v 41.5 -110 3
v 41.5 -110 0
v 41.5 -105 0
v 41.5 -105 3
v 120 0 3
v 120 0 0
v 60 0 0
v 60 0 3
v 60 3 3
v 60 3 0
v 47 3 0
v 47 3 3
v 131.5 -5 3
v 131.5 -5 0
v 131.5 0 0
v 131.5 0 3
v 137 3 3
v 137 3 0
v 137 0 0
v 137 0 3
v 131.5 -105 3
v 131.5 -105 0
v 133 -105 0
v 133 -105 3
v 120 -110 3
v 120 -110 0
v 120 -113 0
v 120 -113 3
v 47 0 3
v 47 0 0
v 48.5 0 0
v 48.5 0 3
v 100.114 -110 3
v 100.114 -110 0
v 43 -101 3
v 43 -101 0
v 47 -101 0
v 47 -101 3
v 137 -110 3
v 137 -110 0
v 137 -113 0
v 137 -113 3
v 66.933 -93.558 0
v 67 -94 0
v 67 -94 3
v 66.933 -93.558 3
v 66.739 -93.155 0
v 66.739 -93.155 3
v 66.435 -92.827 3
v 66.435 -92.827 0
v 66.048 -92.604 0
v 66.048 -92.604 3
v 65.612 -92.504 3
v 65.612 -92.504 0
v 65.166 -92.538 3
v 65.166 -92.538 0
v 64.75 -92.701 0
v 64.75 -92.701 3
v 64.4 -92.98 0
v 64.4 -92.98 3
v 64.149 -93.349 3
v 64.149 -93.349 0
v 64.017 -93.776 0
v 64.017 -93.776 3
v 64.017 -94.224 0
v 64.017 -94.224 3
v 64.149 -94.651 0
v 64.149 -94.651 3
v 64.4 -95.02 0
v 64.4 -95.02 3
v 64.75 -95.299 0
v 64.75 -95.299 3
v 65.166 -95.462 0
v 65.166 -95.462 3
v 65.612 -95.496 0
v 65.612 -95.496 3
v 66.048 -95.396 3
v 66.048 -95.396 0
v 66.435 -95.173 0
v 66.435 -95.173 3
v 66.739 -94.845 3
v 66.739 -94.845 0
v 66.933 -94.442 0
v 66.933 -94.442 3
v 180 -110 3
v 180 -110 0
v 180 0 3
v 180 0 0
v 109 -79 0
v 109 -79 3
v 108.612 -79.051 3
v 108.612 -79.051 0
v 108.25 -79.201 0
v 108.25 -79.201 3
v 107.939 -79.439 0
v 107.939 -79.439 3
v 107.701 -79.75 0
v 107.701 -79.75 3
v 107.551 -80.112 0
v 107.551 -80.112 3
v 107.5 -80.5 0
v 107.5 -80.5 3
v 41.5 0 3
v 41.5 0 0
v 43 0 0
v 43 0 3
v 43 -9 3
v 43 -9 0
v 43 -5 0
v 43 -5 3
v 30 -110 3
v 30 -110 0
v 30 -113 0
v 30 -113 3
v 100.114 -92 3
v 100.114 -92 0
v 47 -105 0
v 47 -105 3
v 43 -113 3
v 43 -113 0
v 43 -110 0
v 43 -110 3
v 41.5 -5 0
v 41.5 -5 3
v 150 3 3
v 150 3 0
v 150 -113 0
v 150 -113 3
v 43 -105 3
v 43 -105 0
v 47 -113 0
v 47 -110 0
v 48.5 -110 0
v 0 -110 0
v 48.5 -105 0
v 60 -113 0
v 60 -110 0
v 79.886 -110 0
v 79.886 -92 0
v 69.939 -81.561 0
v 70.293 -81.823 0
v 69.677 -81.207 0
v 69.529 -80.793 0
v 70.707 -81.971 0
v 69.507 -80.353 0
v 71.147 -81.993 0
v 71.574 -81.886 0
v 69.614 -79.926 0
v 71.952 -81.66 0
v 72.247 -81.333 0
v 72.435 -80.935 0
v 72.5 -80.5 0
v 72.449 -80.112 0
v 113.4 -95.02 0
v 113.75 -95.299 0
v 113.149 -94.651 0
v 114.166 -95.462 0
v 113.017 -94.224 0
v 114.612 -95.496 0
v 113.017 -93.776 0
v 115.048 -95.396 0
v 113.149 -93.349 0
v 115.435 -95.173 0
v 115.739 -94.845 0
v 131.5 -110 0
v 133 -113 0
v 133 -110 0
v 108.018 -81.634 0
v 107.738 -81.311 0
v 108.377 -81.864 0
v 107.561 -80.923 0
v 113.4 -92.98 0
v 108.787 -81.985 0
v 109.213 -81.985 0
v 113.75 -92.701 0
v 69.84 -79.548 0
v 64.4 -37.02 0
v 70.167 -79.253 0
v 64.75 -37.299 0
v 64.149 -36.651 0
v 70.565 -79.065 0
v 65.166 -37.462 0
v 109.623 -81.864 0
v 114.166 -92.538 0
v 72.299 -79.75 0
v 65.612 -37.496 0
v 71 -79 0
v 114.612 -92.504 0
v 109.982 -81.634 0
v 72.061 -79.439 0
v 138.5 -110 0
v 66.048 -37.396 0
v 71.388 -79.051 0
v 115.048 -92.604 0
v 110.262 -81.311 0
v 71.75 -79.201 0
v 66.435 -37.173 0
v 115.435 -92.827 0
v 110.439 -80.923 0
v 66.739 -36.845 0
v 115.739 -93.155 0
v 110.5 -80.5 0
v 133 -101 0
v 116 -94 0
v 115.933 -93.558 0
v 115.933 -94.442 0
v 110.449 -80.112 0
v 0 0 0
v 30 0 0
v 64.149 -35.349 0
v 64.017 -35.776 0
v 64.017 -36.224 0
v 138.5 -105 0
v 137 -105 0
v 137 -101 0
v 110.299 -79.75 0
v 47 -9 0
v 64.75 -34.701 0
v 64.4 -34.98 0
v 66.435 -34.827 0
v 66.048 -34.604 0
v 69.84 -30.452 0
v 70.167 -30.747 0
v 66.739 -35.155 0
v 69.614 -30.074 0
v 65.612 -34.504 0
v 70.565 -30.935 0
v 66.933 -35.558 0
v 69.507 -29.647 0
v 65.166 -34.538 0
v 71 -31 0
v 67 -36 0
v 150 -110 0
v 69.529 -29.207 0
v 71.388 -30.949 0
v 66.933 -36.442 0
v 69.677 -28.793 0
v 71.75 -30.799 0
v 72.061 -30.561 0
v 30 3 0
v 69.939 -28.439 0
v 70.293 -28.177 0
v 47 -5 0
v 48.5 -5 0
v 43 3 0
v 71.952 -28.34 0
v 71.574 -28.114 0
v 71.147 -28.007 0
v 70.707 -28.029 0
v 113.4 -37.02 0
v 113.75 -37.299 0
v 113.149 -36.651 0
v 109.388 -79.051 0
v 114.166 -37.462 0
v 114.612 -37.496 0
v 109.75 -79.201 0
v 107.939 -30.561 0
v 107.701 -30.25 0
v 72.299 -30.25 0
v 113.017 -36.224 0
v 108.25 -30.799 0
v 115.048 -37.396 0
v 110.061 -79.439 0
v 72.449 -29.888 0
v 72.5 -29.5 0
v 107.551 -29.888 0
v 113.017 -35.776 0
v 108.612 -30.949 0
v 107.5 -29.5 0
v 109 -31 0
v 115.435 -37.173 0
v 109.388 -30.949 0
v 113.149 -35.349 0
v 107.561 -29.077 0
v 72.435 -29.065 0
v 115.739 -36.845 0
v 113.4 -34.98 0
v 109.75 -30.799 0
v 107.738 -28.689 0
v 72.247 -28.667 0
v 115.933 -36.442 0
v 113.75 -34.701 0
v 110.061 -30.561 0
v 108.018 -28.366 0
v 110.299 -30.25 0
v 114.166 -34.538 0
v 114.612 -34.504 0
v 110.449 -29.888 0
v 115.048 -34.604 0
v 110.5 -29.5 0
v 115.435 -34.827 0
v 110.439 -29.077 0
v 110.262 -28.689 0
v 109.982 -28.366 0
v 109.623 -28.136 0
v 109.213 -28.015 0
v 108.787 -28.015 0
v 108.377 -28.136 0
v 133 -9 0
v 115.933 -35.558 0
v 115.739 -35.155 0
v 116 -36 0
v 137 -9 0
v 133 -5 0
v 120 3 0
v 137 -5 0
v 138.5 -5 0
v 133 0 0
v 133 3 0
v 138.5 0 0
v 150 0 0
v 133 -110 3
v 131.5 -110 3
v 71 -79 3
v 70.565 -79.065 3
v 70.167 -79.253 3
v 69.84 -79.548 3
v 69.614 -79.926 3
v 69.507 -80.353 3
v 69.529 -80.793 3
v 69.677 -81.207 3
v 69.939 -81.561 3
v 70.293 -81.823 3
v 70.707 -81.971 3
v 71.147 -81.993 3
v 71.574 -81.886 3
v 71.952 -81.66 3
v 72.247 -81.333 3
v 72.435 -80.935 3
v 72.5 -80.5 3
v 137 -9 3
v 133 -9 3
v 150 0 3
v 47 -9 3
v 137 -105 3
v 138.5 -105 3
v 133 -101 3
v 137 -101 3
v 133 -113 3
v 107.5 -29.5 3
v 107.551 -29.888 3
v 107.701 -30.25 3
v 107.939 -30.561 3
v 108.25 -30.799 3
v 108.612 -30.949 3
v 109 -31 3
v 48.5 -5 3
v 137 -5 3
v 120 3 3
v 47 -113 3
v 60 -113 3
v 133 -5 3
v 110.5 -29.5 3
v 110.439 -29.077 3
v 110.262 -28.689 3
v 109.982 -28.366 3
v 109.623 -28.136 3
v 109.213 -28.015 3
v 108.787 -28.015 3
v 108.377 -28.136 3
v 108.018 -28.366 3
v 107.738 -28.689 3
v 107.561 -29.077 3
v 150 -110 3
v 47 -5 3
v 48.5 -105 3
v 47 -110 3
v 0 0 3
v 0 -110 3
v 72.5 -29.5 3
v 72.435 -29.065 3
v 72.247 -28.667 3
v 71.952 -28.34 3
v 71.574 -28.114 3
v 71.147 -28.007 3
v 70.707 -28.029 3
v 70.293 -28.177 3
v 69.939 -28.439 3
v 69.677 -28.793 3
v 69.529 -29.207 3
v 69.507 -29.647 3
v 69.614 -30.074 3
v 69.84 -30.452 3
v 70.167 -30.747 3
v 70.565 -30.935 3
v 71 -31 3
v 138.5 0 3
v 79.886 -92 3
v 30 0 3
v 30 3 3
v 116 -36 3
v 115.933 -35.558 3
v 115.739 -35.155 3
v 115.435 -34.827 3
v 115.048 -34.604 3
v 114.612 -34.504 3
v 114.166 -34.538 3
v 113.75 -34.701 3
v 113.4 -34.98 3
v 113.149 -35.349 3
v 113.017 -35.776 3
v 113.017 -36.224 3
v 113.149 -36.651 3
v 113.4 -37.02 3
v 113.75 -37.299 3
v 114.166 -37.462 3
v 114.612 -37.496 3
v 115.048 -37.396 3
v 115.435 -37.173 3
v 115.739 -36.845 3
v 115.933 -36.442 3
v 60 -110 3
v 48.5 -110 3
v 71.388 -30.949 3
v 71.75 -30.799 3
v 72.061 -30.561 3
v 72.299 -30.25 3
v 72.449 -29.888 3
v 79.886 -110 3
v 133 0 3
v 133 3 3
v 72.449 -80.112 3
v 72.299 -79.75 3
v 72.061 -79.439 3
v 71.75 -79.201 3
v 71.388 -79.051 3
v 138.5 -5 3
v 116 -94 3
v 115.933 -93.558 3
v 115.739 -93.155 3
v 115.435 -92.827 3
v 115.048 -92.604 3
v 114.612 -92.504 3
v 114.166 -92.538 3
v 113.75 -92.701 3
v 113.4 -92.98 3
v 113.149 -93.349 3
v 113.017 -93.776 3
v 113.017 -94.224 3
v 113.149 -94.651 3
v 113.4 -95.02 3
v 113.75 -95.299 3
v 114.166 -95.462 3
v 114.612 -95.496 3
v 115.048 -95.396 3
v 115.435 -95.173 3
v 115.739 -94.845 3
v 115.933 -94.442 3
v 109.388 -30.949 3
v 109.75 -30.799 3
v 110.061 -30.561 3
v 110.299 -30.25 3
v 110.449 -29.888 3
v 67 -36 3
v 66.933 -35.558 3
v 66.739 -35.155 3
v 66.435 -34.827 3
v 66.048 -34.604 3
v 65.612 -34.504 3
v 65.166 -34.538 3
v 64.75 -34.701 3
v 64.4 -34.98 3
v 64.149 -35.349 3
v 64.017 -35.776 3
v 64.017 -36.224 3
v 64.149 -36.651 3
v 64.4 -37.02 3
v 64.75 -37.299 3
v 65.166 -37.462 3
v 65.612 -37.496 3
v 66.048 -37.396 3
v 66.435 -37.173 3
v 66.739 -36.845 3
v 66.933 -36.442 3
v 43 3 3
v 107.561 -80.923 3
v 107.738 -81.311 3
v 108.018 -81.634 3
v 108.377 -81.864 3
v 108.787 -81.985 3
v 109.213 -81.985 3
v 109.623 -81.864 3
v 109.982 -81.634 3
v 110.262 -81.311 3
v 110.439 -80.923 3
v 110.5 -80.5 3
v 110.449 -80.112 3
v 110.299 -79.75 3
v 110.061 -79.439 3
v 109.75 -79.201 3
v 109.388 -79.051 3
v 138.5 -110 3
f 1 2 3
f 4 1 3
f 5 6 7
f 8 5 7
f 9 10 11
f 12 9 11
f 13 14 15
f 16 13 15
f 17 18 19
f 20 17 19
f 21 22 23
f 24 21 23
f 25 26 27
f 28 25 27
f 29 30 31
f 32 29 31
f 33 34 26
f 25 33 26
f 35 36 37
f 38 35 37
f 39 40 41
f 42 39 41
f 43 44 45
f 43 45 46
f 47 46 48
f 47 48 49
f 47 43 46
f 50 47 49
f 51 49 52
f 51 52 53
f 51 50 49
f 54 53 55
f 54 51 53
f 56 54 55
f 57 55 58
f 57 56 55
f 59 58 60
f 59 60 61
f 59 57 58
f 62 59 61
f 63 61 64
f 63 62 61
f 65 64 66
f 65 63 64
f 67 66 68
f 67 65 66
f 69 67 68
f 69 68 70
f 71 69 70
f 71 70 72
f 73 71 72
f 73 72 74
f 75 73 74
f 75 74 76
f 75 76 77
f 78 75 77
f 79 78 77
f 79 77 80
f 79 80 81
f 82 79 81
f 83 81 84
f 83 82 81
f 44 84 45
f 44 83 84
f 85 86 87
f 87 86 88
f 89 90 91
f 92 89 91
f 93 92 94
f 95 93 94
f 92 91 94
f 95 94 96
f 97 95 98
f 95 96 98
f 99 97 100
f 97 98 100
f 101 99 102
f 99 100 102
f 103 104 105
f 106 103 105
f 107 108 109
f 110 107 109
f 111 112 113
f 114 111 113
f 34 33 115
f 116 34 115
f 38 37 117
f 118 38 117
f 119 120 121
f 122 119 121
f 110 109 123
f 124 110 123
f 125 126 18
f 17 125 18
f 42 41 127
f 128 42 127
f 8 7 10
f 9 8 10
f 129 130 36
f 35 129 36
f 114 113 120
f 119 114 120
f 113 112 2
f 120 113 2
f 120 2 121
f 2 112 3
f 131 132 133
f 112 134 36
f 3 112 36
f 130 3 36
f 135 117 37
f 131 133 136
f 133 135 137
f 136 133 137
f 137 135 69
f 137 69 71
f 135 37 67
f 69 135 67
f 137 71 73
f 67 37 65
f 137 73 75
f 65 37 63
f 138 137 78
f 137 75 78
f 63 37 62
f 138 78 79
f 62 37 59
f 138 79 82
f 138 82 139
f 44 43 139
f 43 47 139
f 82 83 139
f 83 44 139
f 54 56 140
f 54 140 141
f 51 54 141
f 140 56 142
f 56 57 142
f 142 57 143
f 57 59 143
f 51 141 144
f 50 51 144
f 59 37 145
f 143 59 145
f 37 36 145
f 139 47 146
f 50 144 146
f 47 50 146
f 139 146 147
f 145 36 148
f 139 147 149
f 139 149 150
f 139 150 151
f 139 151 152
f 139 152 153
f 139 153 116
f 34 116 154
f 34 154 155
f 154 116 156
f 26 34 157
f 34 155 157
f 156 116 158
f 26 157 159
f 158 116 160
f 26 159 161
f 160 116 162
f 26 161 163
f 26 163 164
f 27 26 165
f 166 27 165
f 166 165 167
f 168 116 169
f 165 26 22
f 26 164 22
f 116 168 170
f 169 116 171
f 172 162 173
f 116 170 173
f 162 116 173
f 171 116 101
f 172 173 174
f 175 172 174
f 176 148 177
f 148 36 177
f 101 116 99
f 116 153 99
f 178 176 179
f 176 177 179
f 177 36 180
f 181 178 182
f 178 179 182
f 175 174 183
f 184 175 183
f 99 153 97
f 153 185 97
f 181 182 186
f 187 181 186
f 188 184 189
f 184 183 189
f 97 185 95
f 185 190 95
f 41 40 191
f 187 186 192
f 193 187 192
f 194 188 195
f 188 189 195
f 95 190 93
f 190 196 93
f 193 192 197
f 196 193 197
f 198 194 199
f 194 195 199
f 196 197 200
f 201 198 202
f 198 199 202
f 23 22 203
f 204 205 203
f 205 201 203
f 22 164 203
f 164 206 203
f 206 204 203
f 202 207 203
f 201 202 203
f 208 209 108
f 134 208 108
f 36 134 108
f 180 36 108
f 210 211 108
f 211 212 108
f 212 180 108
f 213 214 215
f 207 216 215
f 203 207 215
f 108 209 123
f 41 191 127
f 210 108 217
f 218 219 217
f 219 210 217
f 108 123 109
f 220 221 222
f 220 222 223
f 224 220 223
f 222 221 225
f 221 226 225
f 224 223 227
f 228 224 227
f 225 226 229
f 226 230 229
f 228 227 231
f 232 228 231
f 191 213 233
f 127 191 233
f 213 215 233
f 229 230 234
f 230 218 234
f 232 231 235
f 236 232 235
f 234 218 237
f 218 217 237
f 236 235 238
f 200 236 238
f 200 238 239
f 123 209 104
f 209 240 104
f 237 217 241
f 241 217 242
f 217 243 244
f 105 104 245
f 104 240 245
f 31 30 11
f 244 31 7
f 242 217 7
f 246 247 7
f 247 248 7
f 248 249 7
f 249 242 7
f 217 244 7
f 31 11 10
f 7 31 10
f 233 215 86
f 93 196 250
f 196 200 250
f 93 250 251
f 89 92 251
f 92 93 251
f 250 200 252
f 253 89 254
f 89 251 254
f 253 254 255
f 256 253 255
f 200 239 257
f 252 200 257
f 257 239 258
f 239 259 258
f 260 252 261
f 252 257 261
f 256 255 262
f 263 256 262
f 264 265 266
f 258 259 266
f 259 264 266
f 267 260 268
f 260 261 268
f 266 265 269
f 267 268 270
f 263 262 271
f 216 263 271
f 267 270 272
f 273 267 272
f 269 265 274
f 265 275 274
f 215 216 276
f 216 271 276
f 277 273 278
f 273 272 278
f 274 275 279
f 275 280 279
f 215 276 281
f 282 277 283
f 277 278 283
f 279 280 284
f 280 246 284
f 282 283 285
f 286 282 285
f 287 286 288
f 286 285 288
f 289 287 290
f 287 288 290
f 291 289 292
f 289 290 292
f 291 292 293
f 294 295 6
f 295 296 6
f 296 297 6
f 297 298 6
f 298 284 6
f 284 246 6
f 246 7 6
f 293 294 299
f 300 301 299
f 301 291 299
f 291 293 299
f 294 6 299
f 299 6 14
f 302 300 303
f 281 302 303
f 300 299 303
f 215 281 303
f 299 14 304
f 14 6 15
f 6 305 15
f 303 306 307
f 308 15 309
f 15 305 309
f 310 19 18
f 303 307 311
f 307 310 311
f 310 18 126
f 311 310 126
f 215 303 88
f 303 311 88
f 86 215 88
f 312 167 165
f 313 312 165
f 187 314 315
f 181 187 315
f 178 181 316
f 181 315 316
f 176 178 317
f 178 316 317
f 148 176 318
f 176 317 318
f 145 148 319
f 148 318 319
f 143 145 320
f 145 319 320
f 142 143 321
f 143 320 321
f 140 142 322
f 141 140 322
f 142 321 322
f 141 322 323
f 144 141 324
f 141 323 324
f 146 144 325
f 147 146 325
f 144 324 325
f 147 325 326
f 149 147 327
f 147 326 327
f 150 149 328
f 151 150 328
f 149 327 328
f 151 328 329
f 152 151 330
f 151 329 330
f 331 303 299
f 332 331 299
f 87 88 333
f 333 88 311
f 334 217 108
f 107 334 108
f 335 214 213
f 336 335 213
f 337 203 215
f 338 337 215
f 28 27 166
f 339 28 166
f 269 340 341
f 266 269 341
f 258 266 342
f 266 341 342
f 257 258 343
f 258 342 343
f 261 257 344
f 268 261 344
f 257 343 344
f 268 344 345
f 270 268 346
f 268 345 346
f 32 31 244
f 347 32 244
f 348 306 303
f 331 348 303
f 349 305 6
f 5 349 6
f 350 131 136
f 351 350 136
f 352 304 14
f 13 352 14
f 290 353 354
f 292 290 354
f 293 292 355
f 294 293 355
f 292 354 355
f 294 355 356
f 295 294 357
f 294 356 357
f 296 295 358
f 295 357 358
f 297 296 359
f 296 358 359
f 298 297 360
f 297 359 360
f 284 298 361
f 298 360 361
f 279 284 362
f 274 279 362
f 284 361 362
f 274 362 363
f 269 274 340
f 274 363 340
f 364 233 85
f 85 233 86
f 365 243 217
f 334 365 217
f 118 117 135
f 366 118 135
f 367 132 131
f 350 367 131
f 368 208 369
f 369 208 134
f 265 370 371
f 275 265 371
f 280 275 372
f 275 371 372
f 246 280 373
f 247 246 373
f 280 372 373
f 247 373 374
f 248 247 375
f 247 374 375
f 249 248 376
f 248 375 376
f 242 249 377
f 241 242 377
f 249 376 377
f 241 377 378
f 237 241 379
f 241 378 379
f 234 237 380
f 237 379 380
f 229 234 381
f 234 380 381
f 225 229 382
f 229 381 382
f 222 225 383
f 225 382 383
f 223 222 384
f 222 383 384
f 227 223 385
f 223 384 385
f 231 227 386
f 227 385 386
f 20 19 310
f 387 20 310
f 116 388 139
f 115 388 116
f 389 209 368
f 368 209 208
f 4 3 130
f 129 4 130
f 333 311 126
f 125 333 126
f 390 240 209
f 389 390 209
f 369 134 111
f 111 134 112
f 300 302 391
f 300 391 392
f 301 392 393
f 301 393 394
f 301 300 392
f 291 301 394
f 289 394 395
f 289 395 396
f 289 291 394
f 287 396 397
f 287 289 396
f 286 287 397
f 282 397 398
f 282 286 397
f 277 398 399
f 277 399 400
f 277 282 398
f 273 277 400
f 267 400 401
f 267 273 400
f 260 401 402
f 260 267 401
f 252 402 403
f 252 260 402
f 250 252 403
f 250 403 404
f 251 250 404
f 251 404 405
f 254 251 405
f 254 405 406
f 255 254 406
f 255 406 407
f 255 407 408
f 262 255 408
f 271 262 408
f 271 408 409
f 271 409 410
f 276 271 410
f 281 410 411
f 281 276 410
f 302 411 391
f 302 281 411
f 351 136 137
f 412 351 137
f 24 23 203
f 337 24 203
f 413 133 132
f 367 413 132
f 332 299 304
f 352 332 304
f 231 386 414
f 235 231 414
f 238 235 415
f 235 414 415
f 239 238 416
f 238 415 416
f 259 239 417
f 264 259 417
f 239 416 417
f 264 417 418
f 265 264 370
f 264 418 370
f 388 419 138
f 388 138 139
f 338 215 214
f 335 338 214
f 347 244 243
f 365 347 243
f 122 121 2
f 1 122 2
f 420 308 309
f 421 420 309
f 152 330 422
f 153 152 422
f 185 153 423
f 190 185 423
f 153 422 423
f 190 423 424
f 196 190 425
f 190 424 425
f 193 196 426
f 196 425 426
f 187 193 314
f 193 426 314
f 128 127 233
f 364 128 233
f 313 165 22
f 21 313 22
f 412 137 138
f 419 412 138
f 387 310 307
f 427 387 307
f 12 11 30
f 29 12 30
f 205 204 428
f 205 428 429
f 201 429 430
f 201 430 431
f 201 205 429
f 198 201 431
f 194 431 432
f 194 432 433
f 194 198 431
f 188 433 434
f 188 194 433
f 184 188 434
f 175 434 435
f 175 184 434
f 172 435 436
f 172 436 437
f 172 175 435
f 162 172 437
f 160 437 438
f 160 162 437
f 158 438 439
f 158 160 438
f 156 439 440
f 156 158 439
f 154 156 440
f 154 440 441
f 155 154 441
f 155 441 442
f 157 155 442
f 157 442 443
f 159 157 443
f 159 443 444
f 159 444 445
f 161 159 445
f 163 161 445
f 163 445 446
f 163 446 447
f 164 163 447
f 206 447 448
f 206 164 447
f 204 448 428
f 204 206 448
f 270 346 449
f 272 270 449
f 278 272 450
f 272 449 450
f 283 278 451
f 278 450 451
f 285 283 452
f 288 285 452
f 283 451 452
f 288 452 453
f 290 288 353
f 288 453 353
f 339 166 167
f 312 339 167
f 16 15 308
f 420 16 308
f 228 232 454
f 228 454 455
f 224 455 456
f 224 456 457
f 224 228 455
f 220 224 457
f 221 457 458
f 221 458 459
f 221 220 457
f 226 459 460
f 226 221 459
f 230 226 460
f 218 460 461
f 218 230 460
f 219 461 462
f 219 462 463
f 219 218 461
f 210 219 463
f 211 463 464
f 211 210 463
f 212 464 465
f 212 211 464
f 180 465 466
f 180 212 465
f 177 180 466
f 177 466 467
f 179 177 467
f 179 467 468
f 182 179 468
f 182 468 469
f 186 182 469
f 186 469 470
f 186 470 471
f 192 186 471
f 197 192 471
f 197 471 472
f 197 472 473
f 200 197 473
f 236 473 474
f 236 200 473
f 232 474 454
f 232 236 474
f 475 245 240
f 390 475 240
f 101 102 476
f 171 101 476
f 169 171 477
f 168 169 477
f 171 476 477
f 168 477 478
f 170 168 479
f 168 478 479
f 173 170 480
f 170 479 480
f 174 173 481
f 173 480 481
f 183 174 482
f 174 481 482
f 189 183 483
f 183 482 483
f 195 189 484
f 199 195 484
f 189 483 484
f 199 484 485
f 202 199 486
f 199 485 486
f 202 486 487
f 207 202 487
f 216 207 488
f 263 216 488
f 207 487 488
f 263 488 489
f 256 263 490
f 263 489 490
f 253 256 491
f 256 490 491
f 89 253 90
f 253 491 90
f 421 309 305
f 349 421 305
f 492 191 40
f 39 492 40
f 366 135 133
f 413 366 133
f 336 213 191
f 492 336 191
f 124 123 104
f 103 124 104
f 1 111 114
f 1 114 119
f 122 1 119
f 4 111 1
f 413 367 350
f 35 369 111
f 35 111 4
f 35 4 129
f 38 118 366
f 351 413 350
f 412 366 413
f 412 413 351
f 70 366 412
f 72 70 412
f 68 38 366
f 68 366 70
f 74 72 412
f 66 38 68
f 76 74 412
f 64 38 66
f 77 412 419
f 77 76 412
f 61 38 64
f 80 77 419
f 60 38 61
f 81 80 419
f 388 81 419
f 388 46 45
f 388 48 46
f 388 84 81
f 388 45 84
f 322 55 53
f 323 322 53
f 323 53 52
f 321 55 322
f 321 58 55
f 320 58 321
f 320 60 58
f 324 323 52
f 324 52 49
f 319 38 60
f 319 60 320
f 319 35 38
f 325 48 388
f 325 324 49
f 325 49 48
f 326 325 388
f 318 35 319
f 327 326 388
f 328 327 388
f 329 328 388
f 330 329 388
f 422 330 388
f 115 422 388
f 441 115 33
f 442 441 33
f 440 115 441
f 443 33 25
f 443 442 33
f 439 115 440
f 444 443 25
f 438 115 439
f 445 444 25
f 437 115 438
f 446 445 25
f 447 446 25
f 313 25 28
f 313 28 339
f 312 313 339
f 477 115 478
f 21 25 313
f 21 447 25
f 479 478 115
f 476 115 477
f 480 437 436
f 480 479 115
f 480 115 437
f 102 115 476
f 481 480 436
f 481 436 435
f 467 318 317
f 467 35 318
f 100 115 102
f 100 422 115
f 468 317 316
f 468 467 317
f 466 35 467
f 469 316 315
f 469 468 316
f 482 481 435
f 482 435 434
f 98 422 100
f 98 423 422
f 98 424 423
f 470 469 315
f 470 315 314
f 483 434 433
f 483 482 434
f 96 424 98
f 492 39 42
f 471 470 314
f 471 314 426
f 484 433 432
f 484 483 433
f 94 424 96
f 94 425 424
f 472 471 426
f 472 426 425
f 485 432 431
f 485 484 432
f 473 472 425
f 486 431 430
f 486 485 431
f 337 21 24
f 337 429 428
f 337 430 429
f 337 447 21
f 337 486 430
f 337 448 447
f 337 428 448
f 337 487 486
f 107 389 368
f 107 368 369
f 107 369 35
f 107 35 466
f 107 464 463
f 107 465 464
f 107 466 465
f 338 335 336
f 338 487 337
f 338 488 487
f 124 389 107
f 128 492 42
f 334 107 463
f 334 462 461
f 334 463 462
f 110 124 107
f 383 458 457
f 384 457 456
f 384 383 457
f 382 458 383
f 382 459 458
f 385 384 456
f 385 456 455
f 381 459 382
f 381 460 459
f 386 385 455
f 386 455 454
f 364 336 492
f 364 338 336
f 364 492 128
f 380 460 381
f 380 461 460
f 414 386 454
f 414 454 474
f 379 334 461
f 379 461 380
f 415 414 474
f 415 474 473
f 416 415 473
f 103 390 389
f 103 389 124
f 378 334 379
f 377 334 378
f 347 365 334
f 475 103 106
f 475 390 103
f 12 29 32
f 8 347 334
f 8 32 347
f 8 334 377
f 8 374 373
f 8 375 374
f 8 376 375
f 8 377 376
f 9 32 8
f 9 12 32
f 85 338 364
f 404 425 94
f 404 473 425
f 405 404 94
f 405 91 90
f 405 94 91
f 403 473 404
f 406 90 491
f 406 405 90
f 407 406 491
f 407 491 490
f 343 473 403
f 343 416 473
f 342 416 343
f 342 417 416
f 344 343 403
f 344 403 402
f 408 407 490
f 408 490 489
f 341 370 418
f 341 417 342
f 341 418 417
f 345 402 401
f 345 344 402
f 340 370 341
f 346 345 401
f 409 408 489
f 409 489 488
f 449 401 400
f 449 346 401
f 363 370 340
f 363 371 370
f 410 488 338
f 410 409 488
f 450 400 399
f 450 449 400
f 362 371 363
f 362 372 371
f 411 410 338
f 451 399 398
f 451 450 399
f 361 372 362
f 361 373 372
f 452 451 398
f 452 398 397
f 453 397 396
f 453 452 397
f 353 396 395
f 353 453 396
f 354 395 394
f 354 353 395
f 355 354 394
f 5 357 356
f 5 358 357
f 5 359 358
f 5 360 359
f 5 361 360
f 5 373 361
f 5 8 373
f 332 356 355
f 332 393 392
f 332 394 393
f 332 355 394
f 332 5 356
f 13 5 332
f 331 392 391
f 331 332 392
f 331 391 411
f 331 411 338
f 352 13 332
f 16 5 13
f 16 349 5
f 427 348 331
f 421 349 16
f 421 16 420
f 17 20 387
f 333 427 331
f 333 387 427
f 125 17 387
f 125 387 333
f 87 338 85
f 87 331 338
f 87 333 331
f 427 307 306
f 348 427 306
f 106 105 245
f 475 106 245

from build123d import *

# Parameters (mm, degrees)
SKETCH_1_W          = 28
SKETCH_1_H          = 42.5
SKETCH_1_R          = 1.5
EXTRUDE_1_DEPTH     = 3
SKETCH1_W           = 20.227510382
SKETCH1_H           = 18
CUT_EXTRUDE1_DEPTH  = 10
CUT_EXTRUDE_1_DEPTH = 213.55117031


with BuildPart() as part:
    # 草图1 → 凸台-拉伸1 (new body)
    # profile 1 of 16: a face of its own
    with BuildSketch(Plane.XY):
        Polygon((41.5, 0), (43, 0), (43, 3), (30, 3), (30, 0), align=None)
    # profile 2 of 16: a face of its own
    with BuildSketch(Plane.XY):
        Polygon((48.5, 0), (60, 0), (60, 3), (47, 3), (47, 0), align=None)
    # profile 3 of 16: a face of its own
    with BuildSketch(Plane.XY):
        Polygon((120, 3), (120, 0), (131.5, 0), (133, 0), (133, 3), align=None)
    # profile 4 of 16: a face of its own
    with BuildSketch(Plane.XY):
        Polygon((137, 3), (137, 0), (138.5, 0), (150, 0), (150, 3), align=None)
    # profile 5 of 16: a face of its own
    with BuildSketch(Plane.XY):
        Polygon((120, 0), (90, 0), (90, -12.5), (118, -12.5), (118, -55), (180, -55), (180, 0), (150, 0), (138.5, 0), (138.5, -5), (137, -5), (137, -9), (133, -9), (133, -5), (131.5, -5), (131.5, 0), align=None)
    # profile 6 of 16: a face of its own
    with BuildSketch(Plane.XY):
        Polygon((90, -12.5), (90, 0), (60, 0), (48.5, 0), (48.5, -5), (47, -5), (47, -9), (43, -9), (43, -5), (41.5, -5), (41.5, 0), (30, 0), (0, 0), (0, -55), (62, -55), (62, -12.5), align=None)
    # profile 7 of 16: a face of its own
    with BuildSketch(Plane.XY):
        with Locations((76, -33.75)):
            Rectangle(SKETCH_1_W, SKETCH_1_H)
        with Locations((65.5, -36)):
            Circle(SKETCH_1_R, mode=Mode.SUBTRACT)
    # profile 8 of 16: a face of its own
    with BuildSketch(Plane.XY):
        with Locations((104, -33.75)):
            Rectangle(SKETCH_1_W, SKETCH_1_H)
        with Locations((114.5, -36)):
            Circle(SKETCH_1_R, mode=Mode.SUBTRACT)
    # profile 9 of 16: a face of its own
    with BuildSketch(Plane.XY):
        Polygon((41.5, -110), (30, -110), (30, -113), (43, -113), (43, -110), align=None)
    # profile 10 of 16: a face of its own
    with BuildSketch(Plane.XY):
        Polygon((60, -113), (60, -110), (48.5, -110), (47, -110), (47, -113), align=None)
    # profile 11 of 16: a face of its own
    with BuildSketch(Plane.XY):
        Polygon((131.5, -110), (120, -110), (120, -113), (133, -113), (133, -110), align=None)
    # profile 12 of 16: a face of its own
    with BuildSketch(Plane.XY):
        Polygon((150, -113), (150, -110), (138.5, -110), (137, -110), (137, -113), align=None)
    # profile 13 of 16: a face of its own
    with BuildSketch(Plane.XY):
        Polygon((118, -97.5), (90, -97.5), (90, -110), (120, -110), (131.5, -110), (131.5, -105), (133, -105), (133, -101), (137, -101), (137, -105), (138.5, -105), (138.5, -110), (150, -110), (180, -110), (180, -55), (118, -55), align=None)
    # profile 14 of 16: a face of its own
    with BuildSketch(Plane.XY):
        Polygon((90, -110), (90, -97.5), (62, -97.5), (62, -55), (0, -55), (0, -110), (30, -110), (41.5, -110), (41.5, -105), (43, -105), (43, -101), (47, -101), (47, -105), (48.5, -105), (48.5, -110), (60, -110), align=None)
    # profile 15 of 16: a face of its own
    with BuildSketch(Plane.XY):
        with Locations((76, -76.25)):
            Rectangle(SKETCH_1_W, SKETCH_1_H)
        with Locations((65.5, -94)):
            Circle(SKETCH_1_R, mode=Mode.SUBTRACT)
    # profile 16 of 16: a face of its own
    with BuildSketch(Plane.XY):
        with Locations((104, -76.25)):
            Rectangle(SKETCH_1_W, SKETCH_1_H)
        with Locations((114.5, -94)):
            Circle(SKETCH_1_R, mode=Mode.SUBTRACT)
    extrude(amount=EXTRUDE_1_DEPTH)

    # Sketch1 → Cut-Extrude1 (cut)
    with BuildSketch(Plane.XY.offset(3)):
        with Locations((90, -101)):
            Rectangle(SKETCH1_W, SKETCH1_H)
    extrude(amount=-CUT_EXTRUDE1_DEPTH, mode=Mode.SUBTRACT)

    # 草图2 → 切除-拉伸1 (cut, through all)
    with BuildSketch(Plane.XY.offset(3)):
        with BuildLine():
            ThreePointArc((72.5, -29.5), (69.939339828, -28.439339828), (71, -31))
            Line((71, -31), (71, -29.5))
            Line((71, -29.5), (72.5, -29.5))
        make_face()
        with BuildLine():
            Line((71, -29.5), (71, -31))
            ThreePointArc((71, -31), (72.060660172, -30.560660172), (72.5, -29.5))
            Line((72.5, -29.5), (71, -29.5))
        make_face()
        with BuildLine():
            ThreePointArc((107.5, -29.5), (107.939339828, -30.560660172), (109, -31))
            Line((109, -31), (109, -29.5))
            Line((109, -29.5), (107.5, -29.5))
        make_face()
        with BuildLine():
            Line((109, -29.5), (109, -31))
            ThreePointArc((109, -31), (110.060660172, -30.560660172), (110.5, -29.5))
            ThreePointArc((110.5, -29.5), (109, -28), (107.5, -29.5))
            Line((107.5, -29.5), (109, -29.5))
        make_face()
        with BuildLine():
            ThreePointArc((72.5, -80.5), (72.060660172, -79.439339828), (71, -79))
            Line((71, -79), (71, -80.5))
            Line((71, -80.5), (72.5, -80.5))
        make_face()
        with BuildLine():
            Line((71, -80.5), (71, -79))
            ThreePointArc((71, -79), (69.939339828, -81.560660172), (72.5, -80.5))
            Line((72.5, -80.5), (71, -80.5))
        make_face()
        with BuildLine():
            ThreePointArc((110.5, -80.5), (110.060660172, -79.439339828), (109, -79))
            Line((109, -79), (109, -80.5))
            Line((109, -80.5), (107.5, -80.5))
            ThreePointArc((107.5, -80.5), (109, -82), (110.5, -80.5))
        make_face()
        with BuildLine():
            Line((109, -80.5), (109, -79))
            ThreePointArc((109, -79), (107.939339828, -79.439339828), (107.5, -80.5))
            Line((107.5, -80.5), (109, -80.5))
        make_face()
    extrude(amount=-CUT_EXTRUDE_1_DEPTH, mode=Mode.SUBTRACT)


solid = part.part
